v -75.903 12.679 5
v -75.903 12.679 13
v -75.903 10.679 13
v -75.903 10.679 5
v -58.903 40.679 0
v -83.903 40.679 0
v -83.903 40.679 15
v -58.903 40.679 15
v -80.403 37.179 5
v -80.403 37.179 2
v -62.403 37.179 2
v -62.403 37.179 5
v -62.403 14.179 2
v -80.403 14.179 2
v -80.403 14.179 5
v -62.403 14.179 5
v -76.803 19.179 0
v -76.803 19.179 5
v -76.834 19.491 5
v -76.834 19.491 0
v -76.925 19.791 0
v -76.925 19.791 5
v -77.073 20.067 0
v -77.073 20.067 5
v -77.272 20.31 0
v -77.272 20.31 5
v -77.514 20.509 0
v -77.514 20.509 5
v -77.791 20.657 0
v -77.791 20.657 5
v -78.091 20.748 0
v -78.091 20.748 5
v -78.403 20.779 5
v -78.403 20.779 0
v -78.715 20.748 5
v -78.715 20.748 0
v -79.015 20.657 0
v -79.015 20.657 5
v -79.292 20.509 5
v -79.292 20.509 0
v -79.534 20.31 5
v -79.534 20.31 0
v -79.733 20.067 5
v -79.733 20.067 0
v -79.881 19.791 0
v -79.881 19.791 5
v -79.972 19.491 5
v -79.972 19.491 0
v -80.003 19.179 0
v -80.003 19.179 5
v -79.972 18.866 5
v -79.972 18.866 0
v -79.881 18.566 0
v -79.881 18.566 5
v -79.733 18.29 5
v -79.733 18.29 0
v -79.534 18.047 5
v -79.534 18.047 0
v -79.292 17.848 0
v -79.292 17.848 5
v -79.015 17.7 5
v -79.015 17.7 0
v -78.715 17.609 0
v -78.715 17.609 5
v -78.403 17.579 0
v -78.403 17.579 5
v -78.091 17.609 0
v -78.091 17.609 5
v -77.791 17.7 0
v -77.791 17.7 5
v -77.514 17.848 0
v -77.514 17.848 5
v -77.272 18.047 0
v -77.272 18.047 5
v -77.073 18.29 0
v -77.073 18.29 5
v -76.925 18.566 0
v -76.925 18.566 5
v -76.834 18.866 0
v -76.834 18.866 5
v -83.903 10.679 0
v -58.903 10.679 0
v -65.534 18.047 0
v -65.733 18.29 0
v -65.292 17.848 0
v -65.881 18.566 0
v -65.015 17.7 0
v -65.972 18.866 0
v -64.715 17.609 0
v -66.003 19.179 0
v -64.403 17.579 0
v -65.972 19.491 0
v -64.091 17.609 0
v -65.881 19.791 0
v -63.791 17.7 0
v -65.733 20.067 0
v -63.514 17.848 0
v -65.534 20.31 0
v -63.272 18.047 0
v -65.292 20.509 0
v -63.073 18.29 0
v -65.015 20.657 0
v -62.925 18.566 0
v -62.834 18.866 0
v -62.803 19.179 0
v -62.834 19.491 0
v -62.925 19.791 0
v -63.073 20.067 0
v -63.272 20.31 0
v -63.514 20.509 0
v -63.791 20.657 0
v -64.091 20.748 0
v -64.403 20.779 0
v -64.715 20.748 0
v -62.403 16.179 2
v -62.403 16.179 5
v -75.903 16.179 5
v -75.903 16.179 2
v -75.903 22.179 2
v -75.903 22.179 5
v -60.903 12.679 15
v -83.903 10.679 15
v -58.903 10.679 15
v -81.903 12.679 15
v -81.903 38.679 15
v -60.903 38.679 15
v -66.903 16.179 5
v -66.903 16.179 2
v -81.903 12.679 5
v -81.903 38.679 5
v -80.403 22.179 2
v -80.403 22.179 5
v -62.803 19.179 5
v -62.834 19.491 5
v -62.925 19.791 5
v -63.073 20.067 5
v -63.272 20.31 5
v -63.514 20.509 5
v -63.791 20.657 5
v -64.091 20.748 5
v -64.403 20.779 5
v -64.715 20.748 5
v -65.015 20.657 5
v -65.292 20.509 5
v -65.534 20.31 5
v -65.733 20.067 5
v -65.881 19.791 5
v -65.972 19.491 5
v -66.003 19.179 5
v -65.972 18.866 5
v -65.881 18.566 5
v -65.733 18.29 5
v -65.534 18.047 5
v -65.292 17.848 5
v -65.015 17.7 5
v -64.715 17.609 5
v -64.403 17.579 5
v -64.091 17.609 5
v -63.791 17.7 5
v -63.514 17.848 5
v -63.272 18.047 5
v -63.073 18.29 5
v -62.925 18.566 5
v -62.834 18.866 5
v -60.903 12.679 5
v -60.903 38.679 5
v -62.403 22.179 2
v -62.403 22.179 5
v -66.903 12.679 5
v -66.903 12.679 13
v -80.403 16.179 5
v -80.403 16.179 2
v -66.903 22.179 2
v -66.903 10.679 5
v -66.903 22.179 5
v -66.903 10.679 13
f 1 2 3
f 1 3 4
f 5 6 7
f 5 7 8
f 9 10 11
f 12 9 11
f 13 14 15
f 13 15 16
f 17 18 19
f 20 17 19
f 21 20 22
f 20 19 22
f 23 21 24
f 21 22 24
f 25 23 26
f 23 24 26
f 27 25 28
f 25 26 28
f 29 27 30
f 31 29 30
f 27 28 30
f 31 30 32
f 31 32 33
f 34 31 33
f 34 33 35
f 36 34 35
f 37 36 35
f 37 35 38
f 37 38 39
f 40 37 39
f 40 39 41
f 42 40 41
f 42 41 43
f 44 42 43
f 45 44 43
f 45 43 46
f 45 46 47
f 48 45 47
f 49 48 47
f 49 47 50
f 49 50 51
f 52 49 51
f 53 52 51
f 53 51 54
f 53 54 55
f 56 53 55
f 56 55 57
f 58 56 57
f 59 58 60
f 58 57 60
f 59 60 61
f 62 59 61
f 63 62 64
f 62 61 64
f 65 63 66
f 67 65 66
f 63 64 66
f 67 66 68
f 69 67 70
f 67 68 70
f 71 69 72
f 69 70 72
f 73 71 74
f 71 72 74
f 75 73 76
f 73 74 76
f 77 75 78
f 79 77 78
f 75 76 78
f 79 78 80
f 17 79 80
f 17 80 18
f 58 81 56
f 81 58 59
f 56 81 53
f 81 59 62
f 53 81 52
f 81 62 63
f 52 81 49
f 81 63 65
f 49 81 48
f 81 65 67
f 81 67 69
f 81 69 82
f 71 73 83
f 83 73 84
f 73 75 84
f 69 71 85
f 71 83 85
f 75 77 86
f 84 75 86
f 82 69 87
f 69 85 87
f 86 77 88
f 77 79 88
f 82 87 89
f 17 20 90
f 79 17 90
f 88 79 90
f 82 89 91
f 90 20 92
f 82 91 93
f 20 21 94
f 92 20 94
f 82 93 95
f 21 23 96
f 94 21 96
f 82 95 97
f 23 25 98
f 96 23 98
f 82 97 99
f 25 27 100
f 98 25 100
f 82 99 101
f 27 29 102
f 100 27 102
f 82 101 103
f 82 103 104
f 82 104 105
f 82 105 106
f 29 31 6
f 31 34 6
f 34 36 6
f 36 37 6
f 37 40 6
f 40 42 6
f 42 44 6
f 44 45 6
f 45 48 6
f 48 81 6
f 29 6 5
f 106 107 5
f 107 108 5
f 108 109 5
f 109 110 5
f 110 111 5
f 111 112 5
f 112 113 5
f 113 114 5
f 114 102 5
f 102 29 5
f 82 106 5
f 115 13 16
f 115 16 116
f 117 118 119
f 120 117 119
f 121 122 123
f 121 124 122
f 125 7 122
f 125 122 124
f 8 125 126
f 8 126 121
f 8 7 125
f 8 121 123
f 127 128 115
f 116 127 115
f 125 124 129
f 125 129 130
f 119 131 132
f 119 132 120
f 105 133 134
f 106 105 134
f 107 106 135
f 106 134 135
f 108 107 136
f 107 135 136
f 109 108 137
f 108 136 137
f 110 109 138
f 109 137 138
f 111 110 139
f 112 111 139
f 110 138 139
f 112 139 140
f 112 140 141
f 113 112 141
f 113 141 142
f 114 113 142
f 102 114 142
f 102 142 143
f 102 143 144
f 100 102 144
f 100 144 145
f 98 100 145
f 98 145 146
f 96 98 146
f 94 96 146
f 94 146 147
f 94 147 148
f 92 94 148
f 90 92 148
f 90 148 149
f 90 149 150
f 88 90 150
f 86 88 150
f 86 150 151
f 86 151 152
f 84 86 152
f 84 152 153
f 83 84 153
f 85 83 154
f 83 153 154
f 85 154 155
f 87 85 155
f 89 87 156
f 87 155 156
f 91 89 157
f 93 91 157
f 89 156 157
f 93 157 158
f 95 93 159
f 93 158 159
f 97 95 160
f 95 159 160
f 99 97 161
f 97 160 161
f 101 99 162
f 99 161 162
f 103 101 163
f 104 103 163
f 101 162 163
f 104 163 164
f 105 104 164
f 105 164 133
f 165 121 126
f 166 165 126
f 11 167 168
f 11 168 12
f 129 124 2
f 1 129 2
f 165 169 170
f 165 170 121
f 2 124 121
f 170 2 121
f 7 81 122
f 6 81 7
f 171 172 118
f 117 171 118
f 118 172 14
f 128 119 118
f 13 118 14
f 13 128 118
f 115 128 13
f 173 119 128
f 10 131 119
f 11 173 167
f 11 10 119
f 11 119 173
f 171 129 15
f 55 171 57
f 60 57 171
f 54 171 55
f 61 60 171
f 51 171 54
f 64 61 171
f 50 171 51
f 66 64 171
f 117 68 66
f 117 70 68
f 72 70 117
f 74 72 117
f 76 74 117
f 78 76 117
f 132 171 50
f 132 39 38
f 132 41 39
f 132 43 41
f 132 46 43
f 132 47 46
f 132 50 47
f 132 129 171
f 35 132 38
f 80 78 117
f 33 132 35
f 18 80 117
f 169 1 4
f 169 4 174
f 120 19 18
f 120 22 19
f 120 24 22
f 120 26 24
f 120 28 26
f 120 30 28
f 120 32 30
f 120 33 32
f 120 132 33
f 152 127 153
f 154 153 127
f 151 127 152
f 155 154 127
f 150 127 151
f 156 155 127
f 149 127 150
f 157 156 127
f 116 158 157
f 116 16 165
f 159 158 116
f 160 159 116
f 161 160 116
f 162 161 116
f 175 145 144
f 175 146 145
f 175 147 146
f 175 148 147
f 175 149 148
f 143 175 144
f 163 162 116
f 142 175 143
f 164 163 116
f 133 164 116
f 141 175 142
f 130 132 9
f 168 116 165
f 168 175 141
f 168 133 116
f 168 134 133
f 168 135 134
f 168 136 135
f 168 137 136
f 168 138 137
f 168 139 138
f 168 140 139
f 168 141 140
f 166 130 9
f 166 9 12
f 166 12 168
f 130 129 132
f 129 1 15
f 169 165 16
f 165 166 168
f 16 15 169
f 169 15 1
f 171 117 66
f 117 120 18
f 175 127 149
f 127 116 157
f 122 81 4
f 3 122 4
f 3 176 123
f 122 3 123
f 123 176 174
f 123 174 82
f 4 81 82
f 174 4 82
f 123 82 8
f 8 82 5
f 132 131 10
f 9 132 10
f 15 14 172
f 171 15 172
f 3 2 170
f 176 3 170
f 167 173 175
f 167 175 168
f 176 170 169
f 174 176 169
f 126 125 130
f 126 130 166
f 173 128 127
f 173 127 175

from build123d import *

# Parameters (mm, degrees)
SKETCH_1_W          = 25
SKETCH_1_H          = 30
EXTRUDE_1_DEPTH     = 15
SKETCH_2_W          = 21
SKETCH_2_H          = 26
CUT_EXTRUDE_1_DEPTH = 13
SKETCH_3_W          = 21
SKETCH_3_H          = 26
SKETCH_3_W_2        = 18
SKETCH_3_H_2        = 23
EXTRUDE_2_DEPTH     = 3
SKETCH_5_W          = 4.5
SKETCH_5_H          = 6
EXTRUDE_3_DEPTH     = 3
SKETCH_6_R          = 1.6
CUT_EXTRUDE_2_DEPTH = 6
SKETCH_7_W          = 9
SKETCH_7_H          = 8
CUT_EXTRUDE_3_DEPTH = 3


with BuildPart() as part:
    # ｽｹｯﾁ1 → ﾎﾞｽ - 押し出し1 (new body)
    with BuildSketch(Plane.XY):
        with Locations((-71.40312059, 25.678571429)):
            Rectangle(SKETCH_1_W, SKETCH_1_H)
    extrude(amount=EXTRUDE_1_DEPTH)

    # ｽｹｯﾁ2 → ｶｯﾄ - 押し出し1 (cut)
    with BuildSketch(Plane.XY.offset(15)):
        with Locations((-71.40312059, 25.678571429)):
            Rectangle(SKETCH_2_W, SKETCH_2_H)
    extrude(amount=-CUT_EXTRUDE_1_DEPTH, mode=Mode.SUBTRACT)

    # ｽｹｯﾁ3 → ﾎﾞｽ - 押し出し2 (add)
    with BuildSketch(Plane.XY.offset(2)):
        with Locations((-71.40312059, 25.678571429)):
            Rectangle(SKETCH_3_W, SKETCH_3_H)
        with Locations((-71.40312059, 25.678571429)):
            Rectangle(SKETCH_3_W_2, SKETCH_3_H_2, mode=Mode.SUBTRACT)
    extrude(amount=EXTRUDE_2_DEPTH)

    # ｽｹｯﾁ5 → ﾎﾞｽ - 押し出し3 (add)
    with BuildSketch(Plane.XY.offset(2)):
        with Locations((-64.65312059, 19.178571429)):
            Rectangle(SKETCH_5_W, SKETCH_5_H)
        with Locations((-78.15312059, 19.178571429)):
            Rectangle(SKETCH_5_W, SKETCH_5_H)
    extrude(amount=EXTRUDE_3_DEPTH)

    # ｽｹｯﾁ6 → ｶｯﾄ - 押し出し2 (cut, through all)
    with BuildSketch(Plane.XY.offset(5)):
        with Locations((-64.40312059, 19.178571429)):
            Circle(SKETCH_6_R)
        with Locations((-78.40312059, 19.178571429)):
            Circle(SKETCH_6_R)
    extrude(amount=-CUT_EXTRUDE_2_DEPTH, mode=Mode.SUBTRACT)

    # ｽｹｯﾁ7 → ｶｯﾄ - 押し出し3 (cut, through all)
    with BuildSketch(Plane(origin=(0, 12.678571429, 0), x_dir=(1, 0, 0), z_dir=(0, 1, 0))):
        with Locations((-71.40312059, -9)):
            Rectangle(SKETCH_7_W, SKETCH_7_H)
    extrude(amount=-CUT_EXTRUDE_3_DEPTH, mode=Mode.SUBTRACT)


solid = part.part
